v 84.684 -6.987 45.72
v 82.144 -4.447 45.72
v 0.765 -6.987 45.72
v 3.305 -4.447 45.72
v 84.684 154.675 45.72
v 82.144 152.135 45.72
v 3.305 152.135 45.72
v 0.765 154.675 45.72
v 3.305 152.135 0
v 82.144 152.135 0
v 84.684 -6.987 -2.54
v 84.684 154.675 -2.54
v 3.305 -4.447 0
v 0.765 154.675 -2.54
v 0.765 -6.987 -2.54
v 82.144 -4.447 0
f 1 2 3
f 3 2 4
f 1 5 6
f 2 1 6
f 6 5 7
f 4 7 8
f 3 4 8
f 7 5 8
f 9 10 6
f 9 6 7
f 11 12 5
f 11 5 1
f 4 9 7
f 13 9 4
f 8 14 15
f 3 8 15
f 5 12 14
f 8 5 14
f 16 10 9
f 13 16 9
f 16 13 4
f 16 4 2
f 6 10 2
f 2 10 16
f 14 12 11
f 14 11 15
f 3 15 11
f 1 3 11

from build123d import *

# Parameters (mm, degrees)
BOSS_EXTRUDE1_DEPTH = 45.72
SHELL1_T            = 2.54


with BuildPart() as part:
    # Sketch7 → Boss-Extrude1 (new body)
    with BuildSketch(Plane.XY):
        Polygon((9.655091904, 152.134877954), (82.143686264, 152.134877954), (82.143686264, -4.447468667), (14.497027414, -4.447468667), (3.305091904, -4.447468667), (3.305091904, 92.914044904), (3.305091904, 152.134877954), align=None)
    extrude(amount=BOSS_EXTRUDE1_DEPTH)

    # Shell1
    shell1_openings = [part.faces().sort_by_distance(p)[0] for p in [
        (42.724389084, 73.843704643, 45.72),
    ]]
    offset(amount=SHELL1_T, openings=shell1_openings, kind=Kind.INTERSECTION)


solid = part.part
